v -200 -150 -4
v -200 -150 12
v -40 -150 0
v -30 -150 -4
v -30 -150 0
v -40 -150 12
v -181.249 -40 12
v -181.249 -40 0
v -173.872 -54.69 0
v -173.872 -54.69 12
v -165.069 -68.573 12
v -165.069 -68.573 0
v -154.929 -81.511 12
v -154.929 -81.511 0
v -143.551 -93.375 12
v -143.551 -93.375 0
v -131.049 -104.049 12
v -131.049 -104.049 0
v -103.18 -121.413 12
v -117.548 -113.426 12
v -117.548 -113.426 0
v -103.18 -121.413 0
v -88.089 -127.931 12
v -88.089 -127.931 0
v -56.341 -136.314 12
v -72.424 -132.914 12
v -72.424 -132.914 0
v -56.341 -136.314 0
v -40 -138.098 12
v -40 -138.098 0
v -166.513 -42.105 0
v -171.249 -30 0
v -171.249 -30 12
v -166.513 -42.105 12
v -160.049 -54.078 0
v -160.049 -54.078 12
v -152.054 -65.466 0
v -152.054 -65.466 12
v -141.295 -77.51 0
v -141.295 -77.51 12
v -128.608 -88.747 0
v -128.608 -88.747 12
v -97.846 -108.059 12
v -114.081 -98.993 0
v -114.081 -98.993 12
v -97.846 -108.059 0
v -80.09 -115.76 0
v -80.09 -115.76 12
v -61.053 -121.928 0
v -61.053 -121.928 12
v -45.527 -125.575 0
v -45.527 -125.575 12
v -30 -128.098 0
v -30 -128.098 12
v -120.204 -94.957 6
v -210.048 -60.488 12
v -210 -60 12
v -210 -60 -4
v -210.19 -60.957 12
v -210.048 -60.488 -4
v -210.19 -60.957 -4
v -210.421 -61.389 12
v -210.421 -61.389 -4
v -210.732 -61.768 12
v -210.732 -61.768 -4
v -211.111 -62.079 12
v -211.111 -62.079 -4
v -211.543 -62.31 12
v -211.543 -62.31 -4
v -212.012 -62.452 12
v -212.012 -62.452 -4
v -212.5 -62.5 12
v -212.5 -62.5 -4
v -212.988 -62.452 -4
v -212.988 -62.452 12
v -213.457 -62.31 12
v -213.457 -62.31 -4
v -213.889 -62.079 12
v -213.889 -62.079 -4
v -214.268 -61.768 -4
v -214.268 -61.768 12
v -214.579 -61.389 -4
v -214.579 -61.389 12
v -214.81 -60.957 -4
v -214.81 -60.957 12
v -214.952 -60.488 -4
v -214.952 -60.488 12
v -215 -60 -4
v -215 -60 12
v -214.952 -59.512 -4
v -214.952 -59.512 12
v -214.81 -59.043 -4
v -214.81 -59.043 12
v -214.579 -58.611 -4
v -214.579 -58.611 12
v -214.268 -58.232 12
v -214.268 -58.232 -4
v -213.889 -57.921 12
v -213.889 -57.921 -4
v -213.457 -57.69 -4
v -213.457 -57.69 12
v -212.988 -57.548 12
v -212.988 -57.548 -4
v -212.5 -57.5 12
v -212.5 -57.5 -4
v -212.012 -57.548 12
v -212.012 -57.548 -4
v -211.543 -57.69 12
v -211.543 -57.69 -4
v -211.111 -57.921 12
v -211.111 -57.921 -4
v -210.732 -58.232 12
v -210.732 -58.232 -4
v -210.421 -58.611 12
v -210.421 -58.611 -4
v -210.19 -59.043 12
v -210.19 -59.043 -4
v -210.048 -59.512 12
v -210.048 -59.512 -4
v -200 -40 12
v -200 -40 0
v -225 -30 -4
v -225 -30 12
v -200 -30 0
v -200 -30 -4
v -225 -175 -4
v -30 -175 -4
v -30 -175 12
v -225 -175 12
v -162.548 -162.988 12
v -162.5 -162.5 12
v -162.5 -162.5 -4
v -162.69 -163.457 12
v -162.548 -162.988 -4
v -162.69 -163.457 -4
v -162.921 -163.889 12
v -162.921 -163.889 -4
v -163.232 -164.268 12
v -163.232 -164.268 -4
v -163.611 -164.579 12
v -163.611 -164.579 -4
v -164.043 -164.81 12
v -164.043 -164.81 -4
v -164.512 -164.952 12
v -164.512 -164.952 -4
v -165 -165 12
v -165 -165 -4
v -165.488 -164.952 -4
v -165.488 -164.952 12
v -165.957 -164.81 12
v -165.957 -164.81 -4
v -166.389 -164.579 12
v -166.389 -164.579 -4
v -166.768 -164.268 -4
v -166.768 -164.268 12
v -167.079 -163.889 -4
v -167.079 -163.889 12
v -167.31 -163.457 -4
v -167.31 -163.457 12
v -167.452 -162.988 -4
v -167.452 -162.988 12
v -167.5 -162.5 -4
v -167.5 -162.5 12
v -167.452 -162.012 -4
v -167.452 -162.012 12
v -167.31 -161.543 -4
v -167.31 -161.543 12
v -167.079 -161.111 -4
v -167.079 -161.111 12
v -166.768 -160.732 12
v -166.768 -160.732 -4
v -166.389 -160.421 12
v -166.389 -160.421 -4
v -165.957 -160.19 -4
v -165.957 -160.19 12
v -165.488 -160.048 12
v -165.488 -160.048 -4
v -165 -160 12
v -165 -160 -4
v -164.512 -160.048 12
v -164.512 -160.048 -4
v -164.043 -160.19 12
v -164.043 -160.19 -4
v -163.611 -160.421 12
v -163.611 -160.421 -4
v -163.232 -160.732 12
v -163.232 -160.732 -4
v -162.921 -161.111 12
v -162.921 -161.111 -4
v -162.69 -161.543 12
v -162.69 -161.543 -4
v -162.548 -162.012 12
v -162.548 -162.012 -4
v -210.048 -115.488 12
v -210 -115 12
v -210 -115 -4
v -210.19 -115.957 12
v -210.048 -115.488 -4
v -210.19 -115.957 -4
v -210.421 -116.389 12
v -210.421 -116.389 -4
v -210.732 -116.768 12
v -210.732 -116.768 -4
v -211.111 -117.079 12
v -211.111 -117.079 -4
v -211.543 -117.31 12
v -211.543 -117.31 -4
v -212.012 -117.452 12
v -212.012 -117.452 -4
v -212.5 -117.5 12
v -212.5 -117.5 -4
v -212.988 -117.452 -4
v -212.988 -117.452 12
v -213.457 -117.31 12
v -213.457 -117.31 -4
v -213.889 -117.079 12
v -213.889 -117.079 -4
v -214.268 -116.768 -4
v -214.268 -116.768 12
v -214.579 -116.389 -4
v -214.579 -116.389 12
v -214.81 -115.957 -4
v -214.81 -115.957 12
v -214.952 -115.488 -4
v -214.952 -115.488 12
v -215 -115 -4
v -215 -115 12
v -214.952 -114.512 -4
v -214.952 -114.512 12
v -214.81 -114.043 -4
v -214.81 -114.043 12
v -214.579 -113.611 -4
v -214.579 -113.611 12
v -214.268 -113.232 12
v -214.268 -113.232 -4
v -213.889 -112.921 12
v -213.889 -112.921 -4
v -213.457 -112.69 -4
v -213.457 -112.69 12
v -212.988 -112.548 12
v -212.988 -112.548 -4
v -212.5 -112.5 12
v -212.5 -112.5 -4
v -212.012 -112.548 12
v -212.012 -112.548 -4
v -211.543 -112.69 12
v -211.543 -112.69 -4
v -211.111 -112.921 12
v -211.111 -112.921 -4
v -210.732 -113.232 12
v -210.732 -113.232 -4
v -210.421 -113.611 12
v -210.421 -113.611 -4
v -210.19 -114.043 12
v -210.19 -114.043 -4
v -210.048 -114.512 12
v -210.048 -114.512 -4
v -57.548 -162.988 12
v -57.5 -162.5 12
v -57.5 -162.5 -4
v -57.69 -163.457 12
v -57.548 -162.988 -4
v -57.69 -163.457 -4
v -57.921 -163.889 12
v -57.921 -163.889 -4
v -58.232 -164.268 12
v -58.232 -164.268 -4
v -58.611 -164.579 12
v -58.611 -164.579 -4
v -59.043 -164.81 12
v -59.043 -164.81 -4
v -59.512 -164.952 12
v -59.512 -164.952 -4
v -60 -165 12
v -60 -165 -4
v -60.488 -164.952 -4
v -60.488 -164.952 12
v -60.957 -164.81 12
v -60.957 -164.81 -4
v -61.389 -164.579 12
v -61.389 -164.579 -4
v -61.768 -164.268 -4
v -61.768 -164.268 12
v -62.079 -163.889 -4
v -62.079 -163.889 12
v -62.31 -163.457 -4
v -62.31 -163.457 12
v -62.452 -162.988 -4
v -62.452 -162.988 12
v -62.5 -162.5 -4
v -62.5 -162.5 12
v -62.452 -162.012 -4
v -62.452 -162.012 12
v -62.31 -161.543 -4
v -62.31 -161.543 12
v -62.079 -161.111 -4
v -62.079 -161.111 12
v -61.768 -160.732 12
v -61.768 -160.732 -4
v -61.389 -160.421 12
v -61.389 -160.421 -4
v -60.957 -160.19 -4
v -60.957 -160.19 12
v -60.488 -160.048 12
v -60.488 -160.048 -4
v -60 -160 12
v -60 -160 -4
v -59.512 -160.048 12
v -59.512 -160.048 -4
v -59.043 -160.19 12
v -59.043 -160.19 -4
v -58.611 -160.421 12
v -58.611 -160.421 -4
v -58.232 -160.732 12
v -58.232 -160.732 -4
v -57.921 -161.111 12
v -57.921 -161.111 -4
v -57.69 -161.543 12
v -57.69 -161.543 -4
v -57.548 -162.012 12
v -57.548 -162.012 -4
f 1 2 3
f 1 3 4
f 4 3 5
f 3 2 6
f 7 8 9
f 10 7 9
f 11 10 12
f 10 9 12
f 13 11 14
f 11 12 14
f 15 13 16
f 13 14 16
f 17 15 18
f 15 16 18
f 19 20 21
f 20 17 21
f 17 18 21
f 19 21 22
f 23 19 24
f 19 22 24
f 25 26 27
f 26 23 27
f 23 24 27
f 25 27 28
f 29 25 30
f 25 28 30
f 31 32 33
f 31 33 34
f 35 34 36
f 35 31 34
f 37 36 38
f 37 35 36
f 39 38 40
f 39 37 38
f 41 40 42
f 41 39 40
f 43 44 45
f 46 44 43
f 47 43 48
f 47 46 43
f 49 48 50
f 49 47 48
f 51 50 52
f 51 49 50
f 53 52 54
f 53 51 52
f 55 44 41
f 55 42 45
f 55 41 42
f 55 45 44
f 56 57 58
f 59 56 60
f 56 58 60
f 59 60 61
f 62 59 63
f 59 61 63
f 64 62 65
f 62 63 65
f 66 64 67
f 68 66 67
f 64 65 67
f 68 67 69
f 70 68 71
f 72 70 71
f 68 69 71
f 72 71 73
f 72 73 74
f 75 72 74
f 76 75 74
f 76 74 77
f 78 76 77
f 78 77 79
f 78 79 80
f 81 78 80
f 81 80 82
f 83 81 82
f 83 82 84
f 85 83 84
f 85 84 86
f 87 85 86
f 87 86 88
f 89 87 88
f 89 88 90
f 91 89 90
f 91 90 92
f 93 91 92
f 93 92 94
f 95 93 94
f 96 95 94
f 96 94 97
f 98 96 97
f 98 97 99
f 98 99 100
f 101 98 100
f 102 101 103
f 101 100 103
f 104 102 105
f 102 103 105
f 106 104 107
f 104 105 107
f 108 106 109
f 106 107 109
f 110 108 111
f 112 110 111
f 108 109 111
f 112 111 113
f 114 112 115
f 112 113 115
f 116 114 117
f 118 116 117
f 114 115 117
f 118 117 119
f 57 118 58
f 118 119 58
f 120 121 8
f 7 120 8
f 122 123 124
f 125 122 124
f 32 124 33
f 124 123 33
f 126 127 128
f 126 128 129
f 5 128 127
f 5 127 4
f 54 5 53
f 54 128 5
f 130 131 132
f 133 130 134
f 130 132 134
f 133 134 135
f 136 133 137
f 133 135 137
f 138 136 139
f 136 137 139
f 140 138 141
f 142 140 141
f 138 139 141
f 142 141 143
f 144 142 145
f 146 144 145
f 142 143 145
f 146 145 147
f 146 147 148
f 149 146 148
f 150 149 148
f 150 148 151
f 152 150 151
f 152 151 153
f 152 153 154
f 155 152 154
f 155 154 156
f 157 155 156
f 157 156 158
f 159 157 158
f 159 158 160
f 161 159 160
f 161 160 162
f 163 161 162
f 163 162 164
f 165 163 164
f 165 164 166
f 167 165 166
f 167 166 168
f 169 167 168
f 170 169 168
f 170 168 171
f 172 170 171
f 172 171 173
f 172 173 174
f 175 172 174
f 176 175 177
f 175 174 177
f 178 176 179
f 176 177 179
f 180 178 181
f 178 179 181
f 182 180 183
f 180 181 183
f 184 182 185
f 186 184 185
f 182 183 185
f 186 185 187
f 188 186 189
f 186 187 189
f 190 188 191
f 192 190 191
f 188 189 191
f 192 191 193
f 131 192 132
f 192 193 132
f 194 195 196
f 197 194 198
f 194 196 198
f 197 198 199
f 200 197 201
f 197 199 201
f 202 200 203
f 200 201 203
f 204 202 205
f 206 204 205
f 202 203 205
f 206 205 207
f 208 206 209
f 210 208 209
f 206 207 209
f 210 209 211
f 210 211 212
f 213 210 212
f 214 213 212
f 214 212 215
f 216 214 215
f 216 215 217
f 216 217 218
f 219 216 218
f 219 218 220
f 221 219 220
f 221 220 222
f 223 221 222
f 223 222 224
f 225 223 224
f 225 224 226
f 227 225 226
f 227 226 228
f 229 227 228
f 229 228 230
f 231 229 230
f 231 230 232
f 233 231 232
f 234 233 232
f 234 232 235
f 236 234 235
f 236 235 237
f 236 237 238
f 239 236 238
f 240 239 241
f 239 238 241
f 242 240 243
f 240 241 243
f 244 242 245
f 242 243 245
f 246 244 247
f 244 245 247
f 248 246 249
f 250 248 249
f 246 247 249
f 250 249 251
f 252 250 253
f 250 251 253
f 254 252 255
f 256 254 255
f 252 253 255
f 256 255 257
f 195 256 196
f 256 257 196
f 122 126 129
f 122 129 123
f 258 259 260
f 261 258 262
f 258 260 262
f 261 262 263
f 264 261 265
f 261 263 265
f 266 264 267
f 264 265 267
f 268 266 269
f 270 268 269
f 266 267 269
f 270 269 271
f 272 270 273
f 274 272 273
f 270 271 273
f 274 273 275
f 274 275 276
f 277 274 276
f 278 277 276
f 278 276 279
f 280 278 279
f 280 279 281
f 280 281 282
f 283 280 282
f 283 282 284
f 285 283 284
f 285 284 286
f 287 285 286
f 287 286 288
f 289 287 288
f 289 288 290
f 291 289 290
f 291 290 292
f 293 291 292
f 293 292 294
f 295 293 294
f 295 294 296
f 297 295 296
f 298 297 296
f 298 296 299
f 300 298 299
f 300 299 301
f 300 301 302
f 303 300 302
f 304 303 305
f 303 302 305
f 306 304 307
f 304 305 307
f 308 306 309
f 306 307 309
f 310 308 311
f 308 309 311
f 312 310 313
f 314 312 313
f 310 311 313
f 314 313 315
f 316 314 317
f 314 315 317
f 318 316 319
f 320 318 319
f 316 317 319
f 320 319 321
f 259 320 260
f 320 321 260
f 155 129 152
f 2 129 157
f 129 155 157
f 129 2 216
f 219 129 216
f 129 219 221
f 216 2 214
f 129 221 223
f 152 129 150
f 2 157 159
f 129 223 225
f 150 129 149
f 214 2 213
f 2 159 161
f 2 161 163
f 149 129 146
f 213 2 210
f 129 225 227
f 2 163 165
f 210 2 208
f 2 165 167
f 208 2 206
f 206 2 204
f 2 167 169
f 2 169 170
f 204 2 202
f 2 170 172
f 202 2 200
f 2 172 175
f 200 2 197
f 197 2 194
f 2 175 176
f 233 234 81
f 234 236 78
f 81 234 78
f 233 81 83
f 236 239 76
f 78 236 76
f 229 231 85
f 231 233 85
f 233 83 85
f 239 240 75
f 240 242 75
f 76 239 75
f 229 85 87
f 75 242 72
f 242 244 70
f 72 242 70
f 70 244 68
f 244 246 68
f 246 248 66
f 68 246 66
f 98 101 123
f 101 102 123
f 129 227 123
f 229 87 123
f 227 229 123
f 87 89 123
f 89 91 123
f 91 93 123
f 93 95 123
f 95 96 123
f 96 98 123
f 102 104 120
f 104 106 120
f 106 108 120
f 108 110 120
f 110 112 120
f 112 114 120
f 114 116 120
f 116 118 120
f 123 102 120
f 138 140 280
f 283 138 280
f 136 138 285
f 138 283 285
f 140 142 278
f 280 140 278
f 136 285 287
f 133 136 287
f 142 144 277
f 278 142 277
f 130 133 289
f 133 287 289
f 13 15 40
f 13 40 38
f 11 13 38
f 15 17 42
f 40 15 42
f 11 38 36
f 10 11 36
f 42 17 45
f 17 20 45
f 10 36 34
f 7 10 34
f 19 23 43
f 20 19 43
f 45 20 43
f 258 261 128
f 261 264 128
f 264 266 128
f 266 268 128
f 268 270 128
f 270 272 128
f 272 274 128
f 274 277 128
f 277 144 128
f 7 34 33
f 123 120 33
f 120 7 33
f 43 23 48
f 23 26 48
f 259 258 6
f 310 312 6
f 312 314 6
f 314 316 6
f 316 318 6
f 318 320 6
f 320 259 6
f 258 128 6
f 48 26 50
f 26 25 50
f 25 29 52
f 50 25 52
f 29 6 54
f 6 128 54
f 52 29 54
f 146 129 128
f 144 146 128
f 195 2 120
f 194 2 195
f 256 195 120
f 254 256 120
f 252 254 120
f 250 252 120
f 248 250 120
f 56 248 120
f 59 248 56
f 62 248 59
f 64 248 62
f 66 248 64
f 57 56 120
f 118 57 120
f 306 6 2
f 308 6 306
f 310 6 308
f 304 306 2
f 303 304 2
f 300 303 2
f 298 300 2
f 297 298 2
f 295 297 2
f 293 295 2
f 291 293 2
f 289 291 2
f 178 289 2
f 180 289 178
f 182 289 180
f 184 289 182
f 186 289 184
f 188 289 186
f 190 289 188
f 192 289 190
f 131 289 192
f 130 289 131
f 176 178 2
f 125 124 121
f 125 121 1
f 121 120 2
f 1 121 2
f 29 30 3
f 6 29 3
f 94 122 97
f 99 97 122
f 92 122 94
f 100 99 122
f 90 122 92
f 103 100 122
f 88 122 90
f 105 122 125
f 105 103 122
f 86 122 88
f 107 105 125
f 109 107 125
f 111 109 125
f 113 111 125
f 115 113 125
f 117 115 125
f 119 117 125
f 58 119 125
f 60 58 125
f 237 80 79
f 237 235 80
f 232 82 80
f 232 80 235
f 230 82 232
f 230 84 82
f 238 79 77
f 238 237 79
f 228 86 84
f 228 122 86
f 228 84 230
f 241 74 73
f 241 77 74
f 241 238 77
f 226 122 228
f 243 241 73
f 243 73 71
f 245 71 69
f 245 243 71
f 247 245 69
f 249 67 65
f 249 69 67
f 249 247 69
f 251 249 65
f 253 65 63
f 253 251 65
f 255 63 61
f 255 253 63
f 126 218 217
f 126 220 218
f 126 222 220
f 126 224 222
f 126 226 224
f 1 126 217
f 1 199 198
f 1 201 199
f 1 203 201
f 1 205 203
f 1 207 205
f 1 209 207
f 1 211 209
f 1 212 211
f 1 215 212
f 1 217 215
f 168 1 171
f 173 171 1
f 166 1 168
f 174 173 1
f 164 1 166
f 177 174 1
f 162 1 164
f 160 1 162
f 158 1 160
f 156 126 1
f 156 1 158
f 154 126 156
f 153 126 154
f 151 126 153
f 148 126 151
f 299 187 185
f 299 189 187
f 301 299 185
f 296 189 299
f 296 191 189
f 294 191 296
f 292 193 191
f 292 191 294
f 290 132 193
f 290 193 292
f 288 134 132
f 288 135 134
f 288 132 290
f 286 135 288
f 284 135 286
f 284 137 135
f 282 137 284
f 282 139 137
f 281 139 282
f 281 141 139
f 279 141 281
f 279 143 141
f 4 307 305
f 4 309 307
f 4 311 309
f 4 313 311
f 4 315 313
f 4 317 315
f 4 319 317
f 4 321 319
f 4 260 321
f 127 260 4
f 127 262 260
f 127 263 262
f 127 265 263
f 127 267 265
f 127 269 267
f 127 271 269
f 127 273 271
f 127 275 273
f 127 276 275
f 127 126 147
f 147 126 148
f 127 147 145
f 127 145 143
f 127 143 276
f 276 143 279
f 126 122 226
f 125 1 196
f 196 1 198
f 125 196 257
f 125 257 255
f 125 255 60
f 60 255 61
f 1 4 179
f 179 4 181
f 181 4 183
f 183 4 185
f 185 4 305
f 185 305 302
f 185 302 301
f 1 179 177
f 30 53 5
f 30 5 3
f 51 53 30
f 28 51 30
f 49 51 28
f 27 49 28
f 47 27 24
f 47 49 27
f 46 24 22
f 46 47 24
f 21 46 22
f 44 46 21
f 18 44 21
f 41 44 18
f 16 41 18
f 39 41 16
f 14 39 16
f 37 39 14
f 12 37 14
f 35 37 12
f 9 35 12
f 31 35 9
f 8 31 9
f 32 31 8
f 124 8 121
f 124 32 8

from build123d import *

# Parameters (mm, degrees)
F1_DEPTH  = 12
F2_W      = 200
F2_H      = 20
F3_DEPTH  = 5
F4_W      = 155
F4_H      = 20
F5_DEPTH  = 5
F6_R      = 2.5
F7_DEPTH  = 25
F9_DEPTH  = 5
F10_W     = 195
F10_H     = 30
F10_W_2   = 30
F10_H_2   = 145
F11_DEPTH = 25
F12_W     = 145
F12_H     = 9
F13_DEPTH = 195.0010001
F15_DEPTH = 25


with BuildPart() as f1:
    # F0 (on Top) → F1 (new body)
    with BuildSketch(Plane.XY):
        with BuildLine():
            add(Edge.make_bspline(
                [(-176, 0), (-176, -130), (0, -130)],
                knots=[3.1415926536, 3.1415926536, 3.1415926536, 4.7123889804, 4.7123889804, 4.7123889804], degree=2, weights=[1, 0.7071067812, 1]))
            Line((-176, 0), (-176, -130))
            Line((-176, -130), (0, -130))
        make_face()
        Polygon((-176, -130), (-176, 0), (-200, 0), (-200, -150), (0, -150), (0, -130), align=None)
    extrude(amount=F1_DEPTH)

    # F2 (on face) → F3 (join)
    with BuildSketch(Plane.XZ.offset(150)):
        with Locations((-100, 6)):
            Rectangle(F2_W, F2_H)
    extrude(amount=F3_DEPTH)

    # F4 (on face) → F5 (join)
    with BuildSketch(Plane(origin=(-200, 0, 0), x_dir=(0, -1, 0), z_dir=(-1, 0, 0))):
        with Locations((77.5, 6)):
            Rectangle(F4_W, F4_H)
    extrude(amount=F5_DEPTH)

    # F6 (on face) → F7 (join)
    with BuildSketch(Plane(origin=(0, 0, -4), x_dir=(1, 0, 0), z_dir=(0, 0, -1))):
        Polygon((0, 155), (0, 175), (-225, 175), (-225, 0), (-205, 0), (-205, 155), align=None)
        with Locations((-212.5, 60)):
            Circle(F6_R, mode=Mode.SUBTRACT)
        with Locations((-212.5, 115)):
            Circle(F6_R, mode=Mode.SUBTRACT)
        with Locations((-165, 162.5)):
            Circle(F6_R, mode=Mode.SUBTRACT)
        with Locations((-60, 162.5)):
            Circle(F6_R, mode=Mode.SUBTRACT)
    extrude(amount=-F7_DEPTH)

    # F8 (on face) → F9 (join)
    with BuildSketch(Plane.XY.offset(16)):
        Polygon((-190, 0), (-205, 0), (-205, -155), (0, -155), (0, -140), (-190, -140), align=None)
    extrude(amount=F9_DEPTH)

    # F10 (on Top) → F11 (cut, symmetric)
    with BuildSketch(Plane.XY):
        with Locations((-127.5, -15)):
            Rectangle(F10_W, F10_H)
        with Locations((-15, -15)):
            Rectangle(F10_W_2, F10_H)
        with Locations((-15, -102.5)):
            Rectangle(F10_W_2, F10_H_2)
    extrude(amount=F11_DEPTH, both=True, mode=Mode.SUBTRACT)

    # F12 (on face) → F13 (cut, through all)
    with BuildSketch(Plane.YZ.offset(-30)):
        with Locations((-102.5, 16.5)):
            Rectangle(F12_W, F12_H)
    extrude(amount=-F13_DEPTH, mode=Mode.SUBTRACT)

    # F14 (on face) → F15 (cut)
    with BuildSketch(Plane(origin=(0, 0, 0), x_dir=(1, 0, 0), z_dir=(0, 0, -1))):
        with BuildLine():
            ThreePointArc((-181.2494979045, 40), (-124.4154289012, 108.9058025162), (-40, 138.0975202339))
            Line((-40, 138.0975202339), (-40, 150))
            Line((-40, 150), (-200, 150))
            Line((-200, 150), (-200, 40))
            Line((-200, 40), (-181.2494979045, 40))
        make_face()
    extrude(amount=-F15_DEPTH, mode=Mode.SUBTRACT)


solid = f1.part
